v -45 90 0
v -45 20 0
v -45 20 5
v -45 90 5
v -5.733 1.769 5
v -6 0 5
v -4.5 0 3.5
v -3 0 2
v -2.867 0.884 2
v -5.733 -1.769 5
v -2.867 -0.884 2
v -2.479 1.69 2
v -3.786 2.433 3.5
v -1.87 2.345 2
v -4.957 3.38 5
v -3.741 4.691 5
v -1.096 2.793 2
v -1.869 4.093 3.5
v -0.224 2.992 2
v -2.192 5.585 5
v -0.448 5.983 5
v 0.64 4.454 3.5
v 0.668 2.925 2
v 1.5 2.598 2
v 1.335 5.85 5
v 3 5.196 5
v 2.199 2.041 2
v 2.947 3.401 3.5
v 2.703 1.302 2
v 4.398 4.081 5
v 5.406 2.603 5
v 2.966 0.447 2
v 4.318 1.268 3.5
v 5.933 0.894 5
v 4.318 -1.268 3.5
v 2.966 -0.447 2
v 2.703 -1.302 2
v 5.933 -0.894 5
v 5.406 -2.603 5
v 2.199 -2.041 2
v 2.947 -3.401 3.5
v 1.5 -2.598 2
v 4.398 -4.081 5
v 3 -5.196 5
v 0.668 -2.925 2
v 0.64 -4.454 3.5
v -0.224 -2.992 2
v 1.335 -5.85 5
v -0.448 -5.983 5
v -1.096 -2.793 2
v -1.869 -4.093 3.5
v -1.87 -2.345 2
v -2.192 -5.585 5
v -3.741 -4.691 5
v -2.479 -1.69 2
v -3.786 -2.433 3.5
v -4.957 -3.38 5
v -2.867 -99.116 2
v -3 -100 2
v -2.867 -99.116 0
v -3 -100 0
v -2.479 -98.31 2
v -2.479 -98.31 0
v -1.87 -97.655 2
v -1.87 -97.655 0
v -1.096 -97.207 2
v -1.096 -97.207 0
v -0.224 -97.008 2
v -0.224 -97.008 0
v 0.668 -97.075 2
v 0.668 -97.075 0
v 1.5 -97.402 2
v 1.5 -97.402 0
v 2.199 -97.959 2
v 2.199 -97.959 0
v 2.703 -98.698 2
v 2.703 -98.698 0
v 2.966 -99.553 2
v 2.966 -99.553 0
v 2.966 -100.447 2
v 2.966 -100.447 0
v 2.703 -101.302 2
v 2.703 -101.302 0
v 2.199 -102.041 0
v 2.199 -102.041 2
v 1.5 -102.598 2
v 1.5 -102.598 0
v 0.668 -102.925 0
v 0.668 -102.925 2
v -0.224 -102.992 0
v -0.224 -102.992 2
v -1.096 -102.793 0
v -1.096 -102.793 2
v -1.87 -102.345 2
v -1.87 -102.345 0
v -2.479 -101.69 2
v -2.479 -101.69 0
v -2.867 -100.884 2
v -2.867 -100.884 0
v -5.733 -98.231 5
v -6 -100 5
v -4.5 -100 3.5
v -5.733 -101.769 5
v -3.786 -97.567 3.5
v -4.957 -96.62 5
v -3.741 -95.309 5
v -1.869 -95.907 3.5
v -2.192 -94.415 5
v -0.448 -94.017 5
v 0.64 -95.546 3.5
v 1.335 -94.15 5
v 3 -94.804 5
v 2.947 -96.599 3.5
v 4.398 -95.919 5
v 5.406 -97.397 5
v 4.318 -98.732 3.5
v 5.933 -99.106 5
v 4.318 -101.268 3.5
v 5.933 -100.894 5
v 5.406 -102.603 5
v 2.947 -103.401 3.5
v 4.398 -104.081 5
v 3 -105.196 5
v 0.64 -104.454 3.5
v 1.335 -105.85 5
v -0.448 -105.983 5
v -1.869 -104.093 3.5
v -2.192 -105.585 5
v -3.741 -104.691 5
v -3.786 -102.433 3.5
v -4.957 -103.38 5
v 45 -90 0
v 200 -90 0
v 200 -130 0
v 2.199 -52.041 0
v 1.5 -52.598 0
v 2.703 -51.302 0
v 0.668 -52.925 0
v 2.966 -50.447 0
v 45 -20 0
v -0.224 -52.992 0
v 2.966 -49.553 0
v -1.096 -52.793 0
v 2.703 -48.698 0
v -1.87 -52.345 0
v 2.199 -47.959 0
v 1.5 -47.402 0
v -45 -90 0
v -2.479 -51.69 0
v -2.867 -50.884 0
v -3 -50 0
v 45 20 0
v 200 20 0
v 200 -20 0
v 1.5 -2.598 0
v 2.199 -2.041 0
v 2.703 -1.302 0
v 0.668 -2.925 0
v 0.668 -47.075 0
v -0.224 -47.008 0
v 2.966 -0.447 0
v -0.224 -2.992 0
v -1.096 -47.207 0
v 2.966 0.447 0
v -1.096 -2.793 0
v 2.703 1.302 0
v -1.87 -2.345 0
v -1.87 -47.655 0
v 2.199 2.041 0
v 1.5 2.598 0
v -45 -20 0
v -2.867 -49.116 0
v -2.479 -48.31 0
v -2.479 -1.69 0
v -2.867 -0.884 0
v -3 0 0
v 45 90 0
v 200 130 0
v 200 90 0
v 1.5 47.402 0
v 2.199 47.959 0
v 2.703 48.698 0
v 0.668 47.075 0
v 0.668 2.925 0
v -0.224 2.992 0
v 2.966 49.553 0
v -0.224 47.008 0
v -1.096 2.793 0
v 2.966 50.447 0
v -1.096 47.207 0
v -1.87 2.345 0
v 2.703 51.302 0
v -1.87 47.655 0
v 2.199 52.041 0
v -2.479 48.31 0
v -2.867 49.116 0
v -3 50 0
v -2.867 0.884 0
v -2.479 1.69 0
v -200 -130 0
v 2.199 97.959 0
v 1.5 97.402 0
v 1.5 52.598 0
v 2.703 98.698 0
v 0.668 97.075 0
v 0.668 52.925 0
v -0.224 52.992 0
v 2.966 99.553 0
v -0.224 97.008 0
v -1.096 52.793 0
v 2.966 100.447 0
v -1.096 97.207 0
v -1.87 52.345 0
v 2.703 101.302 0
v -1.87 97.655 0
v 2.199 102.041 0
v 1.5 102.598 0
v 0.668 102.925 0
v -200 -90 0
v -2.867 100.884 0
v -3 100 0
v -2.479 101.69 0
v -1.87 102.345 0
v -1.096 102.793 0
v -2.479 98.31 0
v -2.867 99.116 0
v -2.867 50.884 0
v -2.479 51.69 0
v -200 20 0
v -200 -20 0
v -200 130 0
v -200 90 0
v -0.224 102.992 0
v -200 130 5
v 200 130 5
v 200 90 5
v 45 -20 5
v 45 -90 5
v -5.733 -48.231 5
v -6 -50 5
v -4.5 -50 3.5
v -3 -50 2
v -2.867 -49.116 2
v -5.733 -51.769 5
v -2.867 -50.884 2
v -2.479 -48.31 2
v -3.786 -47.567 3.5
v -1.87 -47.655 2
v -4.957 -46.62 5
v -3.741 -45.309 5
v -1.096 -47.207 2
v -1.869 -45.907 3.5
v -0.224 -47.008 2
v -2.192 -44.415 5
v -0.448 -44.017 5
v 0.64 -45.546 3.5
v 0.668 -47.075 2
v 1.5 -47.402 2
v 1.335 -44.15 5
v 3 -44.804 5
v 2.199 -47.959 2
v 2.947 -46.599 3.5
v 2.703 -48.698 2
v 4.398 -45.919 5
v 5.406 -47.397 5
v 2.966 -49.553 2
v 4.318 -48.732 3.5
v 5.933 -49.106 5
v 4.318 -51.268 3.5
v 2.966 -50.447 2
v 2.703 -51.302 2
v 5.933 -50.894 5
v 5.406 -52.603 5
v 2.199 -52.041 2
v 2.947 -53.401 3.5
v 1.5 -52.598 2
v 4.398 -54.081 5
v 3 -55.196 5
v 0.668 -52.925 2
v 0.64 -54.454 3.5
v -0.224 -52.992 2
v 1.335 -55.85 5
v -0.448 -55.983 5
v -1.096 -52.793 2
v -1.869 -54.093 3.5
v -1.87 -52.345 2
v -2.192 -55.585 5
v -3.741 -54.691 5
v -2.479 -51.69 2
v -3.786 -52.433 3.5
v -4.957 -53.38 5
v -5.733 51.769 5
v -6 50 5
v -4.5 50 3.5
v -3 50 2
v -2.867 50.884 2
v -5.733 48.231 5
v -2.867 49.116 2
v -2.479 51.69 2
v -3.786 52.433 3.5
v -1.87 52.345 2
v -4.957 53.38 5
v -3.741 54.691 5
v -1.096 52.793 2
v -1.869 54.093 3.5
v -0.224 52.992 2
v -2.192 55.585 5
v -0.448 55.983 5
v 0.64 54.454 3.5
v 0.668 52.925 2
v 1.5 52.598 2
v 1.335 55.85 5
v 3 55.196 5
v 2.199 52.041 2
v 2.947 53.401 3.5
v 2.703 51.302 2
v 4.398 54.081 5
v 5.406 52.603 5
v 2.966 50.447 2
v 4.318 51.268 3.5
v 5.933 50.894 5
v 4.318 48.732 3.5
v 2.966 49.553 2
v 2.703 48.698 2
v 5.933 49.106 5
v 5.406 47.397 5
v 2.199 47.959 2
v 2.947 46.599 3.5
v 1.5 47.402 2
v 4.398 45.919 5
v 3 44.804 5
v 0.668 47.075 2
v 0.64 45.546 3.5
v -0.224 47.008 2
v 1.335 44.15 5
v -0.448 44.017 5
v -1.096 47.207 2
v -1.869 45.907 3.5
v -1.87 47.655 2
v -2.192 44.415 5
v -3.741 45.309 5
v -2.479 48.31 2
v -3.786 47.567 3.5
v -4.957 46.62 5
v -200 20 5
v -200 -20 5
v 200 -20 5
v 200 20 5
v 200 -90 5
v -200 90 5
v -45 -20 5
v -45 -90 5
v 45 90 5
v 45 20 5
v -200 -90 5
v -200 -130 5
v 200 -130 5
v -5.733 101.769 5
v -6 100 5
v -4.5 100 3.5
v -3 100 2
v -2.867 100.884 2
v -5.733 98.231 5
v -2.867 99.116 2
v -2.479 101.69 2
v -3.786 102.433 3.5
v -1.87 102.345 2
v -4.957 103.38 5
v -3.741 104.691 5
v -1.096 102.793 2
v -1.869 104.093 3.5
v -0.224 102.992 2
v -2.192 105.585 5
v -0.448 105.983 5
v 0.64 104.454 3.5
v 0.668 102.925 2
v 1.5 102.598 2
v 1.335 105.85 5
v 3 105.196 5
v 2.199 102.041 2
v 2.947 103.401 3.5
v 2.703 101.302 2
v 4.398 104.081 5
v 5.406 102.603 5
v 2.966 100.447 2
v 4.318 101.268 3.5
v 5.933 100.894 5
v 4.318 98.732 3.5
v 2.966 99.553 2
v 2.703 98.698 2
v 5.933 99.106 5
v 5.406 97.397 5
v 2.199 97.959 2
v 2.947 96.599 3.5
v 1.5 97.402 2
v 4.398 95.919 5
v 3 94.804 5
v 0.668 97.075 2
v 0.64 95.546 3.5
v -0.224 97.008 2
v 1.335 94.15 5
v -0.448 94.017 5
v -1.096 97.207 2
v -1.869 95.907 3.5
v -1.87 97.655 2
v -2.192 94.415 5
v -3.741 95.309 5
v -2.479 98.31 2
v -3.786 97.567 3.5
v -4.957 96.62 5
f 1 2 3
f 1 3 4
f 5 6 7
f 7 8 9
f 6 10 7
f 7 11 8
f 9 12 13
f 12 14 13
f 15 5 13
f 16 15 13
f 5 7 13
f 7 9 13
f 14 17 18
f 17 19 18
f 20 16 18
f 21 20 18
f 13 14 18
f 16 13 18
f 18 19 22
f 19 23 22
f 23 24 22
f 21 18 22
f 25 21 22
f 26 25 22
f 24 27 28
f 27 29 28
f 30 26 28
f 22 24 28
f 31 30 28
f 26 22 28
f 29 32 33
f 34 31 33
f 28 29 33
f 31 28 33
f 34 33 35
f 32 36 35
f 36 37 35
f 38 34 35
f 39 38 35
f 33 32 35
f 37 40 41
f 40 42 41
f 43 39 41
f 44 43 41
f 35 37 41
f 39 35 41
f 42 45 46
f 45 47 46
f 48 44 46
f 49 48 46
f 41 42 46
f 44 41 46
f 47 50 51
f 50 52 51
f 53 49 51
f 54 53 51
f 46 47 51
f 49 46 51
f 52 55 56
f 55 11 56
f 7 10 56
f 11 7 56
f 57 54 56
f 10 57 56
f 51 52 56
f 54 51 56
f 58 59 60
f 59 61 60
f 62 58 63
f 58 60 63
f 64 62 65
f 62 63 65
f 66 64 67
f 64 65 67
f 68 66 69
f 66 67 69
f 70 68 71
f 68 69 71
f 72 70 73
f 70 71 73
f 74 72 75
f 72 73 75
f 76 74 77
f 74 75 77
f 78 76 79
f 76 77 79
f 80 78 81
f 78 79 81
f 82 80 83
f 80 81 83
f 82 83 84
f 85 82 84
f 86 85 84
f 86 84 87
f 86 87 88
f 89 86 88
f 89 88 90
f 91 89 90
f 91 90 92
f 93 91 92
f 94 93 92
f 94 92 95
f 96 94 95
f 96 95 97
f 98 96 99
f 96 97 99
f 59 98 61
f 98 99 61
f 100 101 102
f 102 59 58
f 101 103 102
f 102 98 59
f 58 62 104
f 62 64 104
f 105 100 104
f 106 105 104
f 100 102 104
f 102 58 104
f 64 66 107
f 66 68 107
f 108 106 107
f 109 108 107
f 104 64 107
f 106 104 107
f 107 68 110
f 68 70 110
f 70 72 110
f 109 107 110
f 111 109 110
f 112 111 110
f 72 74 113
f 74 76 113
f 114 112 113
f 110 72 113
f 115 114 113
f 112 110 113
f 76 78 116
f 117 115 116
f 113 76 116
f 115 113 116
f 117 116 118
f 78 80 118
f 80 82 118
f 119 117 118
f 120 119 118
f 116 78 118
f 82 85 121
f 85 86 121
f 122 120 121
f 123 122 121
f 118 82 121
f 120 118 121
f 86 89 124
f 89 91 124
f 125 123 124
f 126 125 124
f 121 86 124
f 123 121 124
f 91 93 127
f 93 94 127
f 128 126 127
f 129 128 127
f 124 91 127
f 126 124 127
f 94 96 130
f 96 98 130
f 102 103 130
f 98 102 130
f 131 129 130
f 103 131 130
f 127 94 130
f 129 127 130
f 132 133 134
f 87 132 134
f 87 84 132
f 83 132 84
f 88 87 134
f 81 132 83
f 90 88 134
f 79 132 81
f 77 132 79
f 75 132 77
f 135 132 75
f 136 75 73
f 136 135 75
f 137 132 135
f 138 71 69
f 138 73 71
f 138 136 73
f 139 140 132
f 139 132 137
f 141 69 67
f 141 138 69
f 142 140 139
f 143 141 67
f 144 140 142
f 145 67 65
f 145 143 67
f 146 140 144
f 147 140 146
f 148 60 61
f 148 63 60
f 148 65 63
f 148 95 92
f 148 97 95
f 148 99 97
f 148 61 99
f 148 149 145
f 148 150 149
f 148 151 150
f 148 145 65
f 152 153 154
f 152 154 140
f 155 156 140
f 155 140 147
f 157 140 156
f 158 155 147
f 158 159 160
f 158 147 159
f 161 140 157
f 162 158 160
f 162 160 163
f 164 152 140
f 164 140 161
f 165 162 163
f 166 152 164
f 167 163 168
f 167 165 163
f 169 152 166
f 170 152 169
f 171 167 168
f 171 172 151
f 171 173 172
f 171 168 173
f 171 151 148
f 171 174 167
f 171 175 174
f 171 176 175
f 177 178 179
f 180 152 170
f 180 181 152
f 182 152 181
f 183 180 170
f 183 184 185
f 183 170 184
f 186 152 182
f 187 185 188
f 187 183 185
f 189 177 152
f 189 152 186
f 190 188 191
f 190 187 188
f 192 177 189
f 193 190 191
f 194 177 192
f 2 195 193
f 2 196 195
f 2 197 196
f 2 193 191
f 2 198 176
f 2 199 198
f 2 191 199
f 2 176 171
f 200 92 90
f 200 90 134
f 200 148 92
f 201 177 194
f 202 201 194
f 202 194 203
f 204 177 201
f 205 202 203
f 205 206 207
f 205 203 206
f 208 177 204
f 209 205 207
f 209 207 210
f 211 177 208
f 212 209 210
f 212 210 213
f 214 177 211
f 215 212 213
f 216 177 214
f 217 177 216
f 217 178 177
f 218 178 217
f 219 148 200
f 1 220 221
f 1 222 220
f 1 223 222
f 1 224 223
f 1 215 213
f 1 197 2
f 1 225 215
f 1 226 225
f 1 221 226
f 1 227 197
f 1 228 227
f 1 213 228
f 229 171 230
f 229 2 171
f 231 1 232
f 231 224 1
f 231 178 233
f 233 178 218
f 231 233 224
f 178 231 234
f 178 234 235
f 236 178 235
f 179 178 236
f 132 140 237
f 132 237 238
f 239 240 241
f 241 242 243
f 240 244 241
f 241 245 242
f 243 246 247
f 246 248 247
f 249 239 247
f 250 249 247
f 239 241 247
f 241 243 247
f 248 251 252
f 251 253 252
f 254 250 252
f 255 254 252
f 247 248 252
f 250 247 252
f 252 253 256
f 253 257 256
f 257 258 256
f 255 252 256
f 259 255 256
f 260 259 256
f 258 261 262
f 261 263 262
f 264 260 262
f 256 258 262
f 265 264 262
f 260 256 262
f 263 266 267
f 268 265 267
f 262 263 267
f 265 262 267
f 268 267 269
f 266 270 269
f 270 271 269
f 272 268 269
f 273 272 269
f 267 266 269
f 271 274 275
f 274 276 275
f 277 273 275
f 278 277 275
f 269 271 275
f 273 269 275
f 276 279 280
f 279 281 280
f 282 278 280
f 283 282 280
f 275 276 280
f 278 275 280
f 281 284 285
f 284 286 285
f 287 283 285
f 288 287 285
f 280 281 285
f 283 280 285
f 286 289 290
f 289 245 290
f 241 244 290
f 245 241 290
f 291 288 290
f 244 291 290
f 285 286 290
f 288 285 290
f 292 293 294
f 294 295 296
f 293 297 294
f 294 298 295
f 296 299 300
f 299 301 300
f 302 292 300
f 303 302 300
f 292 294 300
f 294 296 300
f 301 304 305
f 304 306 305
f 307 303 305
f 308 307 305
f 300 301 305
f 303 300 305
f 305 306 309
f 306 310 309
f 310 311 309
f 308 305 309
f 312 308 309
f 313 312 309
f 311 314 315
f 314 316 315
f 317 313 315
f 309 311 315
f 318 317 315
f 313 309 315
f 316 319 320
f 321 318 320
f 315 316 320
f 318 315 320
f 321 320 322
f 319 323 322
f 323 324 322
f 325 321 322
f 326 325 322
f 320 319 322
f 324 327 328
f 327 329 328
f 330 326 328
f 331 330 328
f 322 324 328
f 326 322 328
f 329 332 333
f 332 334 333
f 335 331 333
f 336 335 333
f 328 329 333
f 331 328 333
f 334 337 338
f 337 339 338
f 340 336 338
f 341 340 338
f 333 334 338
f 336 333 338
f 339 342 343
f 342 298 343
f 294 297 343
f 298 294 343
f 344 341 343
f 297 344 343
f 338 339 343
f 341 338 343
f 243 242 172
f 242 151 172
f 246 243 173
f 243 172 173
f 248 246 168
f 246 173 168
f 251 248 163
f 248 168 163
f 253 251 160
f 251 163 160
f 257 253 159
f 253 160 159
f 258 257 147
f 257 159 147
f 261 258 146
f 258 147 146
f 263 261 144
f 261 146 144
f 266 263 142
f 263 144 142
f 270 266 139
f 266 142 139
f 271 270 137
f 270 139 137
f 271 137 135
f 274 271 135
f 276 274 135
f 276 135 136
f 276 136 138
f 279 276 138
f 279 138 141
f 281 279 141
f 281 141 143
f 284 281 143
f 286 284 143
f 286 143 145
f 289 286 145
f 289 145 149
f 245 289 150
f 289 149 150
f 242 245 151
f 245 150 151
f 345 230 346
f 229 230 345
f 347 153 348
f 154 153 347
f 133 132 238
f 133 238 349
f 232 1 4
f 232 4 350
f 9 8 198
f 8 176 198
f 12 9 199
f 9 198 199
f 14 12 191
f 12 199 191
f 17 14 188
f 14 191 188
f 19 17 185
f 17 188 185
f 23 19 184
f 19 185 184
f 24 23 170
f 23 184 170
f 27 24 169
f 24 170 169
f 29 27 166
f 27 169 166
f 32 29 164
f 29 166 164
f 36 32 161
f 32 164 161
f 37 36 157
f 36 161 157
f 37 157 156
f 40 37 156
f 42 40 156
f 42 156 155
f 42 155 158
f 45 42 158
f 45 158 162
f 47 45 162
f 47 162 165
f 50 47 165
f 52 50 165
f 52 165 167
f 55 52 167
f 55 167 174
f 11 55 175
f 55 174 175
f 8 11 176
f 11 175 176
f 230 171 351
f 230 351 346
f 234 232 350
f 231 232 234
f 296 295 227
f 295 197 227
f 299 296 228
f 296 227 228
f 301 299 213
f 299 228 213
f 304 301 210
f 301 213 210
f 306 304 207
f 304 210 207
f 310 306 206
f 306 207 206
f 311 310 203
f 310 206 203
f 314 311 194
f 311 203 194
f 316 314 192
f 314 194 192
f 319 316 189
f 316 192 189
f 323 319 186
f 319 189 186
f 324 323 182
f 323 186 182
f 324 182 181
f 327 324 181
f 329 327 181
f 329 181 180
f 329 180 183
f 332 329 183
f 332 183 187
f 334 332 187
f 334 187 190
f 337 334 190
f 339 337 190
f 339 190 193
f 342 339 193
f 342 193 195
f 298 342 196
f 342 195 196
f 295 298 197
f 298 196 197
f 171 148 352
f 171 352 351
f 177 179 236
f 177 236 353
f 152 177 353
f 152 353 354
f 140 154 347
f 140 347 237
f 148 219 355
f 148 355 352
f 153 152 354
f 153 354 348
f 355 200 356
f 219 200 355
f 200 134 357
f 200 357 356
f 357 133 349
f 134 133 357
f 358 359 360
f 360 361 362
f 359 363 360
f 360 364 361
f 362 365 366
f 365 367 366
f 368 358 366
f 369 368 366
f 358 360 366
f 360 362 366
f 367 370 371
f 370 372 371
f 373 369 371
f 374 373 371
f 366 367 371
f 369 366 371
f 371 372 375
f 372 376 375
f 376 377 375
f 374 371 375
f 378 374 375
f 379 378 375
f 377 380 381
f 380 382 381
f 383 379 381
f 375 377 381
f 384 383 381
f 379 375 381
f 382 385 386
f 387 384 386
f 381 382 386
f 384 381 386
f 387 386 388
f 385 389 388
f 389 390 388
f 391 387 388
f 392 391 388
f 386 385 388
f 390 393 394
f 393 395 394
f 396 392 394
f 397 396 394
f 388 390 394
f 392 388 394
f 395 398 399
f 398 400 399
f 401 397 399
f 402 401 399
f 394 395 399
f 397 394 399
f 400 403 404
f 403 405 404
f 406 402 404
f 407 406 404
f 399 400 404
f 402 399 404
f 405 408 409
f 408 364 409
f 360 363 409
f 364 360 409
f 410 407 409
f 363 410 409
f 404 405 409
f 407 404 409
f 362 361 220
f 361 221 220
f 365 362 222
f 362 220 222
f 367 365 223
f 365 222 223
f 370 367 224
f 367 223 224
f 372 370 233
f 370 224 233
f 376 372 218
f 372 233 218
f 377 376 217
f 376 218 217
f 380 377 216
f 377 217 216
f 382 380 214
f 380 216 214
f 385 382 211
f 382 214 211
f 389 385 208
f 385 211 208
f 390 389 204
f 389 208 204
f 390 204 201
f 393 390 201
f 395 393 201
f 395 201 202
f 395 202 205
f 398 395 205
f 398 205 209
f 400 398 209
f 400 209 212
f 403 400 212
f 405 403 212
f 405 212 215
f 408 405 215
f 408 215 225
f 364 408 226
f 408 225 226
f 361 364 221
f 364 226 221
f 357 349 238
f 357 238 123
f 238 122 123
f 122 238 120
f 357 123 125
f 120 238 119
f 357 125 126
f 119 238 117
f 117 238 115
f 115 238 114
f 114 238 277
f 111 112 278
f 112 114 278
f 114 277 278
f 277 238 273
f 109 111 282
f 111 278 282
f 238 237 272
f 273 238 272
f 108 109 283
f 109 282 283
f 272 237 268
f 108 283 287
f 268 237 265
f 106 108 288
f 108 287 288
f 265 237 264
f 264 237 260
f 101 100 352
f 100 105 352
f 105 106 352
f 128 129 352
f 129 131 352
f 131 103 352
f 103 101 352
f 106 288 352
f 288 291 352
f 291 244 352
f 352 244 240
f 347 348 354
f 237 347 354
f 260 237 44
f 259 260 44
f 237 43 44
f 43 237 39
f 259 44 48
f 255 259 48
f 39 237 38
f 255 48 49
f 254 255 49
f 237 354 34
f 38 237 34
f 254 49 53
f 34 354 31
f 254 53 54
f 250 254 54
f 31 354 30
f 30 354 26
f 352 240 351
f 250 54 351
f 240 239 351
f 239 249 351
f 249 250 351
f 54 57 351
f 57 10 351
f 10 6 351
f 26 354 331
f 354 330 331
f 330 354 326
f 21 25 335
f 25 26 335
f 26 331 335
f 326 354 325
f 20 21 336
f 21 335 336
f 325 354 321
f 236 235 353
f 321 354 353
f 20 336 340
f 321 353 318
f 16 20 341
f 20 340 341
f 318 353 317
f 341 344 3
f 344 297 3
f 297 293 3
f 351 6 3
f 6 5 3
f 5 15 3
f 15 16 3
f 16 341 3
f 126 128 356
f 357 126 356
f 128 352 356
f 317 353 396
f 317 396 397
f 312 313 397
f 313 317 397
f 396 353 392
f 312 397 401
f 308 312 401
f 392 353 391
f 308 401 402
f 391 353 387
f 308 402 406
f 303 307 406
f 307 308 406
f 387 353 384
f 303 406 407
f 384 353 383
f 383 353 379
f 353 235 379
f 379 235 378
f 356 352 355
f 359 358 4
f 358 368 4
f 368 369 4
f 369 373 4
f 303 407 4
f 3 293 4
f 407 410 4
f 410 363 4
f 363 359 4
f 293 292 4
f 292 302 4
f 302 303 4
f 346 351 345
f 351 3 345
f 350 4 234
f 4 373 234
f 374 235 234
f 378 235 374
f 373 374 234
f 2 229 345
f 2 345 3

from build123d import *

# Parameters (mm, degrees)
PAD_DEPTH        = 5
HOLE_D           = 6
HOLE_DEPTH       = 25
HOLE_CSINK_D     = 12
HOLE_CSINK_ANGLE = 90


with BuildPart() as part:
    # Sketch → Pad (new body)
    with BuildSketch(Plane.XY):
        Polygon((-200, 130), (200, 130), (200, 90), (45, 90), (45, 20), (200, 20), (200, -20), (45, -20), (45, -90), (200, -90), (200, -130), (-200, -130), (-200, -90), (-45, -90), (-45, -20), (-200, -20), (-200, 20), (-45, 20), (-45, 90), (-200, 90), align=None)
    extrude(amount=PAD_DEPTH)

    # Hole
    with Locations(Plane.XY.offset(5)):
        with Locations((0, 0), (0, 50), (0, 100), (0, -50), (0, -100)):
            CounterSinkHole(HOLE_D / 2, HOLE_CSINK_D / 2, depth=HOLE_DEPTH, counter_sink_angle=HOLE_CSINK_ANGLE)


solid = part.part
